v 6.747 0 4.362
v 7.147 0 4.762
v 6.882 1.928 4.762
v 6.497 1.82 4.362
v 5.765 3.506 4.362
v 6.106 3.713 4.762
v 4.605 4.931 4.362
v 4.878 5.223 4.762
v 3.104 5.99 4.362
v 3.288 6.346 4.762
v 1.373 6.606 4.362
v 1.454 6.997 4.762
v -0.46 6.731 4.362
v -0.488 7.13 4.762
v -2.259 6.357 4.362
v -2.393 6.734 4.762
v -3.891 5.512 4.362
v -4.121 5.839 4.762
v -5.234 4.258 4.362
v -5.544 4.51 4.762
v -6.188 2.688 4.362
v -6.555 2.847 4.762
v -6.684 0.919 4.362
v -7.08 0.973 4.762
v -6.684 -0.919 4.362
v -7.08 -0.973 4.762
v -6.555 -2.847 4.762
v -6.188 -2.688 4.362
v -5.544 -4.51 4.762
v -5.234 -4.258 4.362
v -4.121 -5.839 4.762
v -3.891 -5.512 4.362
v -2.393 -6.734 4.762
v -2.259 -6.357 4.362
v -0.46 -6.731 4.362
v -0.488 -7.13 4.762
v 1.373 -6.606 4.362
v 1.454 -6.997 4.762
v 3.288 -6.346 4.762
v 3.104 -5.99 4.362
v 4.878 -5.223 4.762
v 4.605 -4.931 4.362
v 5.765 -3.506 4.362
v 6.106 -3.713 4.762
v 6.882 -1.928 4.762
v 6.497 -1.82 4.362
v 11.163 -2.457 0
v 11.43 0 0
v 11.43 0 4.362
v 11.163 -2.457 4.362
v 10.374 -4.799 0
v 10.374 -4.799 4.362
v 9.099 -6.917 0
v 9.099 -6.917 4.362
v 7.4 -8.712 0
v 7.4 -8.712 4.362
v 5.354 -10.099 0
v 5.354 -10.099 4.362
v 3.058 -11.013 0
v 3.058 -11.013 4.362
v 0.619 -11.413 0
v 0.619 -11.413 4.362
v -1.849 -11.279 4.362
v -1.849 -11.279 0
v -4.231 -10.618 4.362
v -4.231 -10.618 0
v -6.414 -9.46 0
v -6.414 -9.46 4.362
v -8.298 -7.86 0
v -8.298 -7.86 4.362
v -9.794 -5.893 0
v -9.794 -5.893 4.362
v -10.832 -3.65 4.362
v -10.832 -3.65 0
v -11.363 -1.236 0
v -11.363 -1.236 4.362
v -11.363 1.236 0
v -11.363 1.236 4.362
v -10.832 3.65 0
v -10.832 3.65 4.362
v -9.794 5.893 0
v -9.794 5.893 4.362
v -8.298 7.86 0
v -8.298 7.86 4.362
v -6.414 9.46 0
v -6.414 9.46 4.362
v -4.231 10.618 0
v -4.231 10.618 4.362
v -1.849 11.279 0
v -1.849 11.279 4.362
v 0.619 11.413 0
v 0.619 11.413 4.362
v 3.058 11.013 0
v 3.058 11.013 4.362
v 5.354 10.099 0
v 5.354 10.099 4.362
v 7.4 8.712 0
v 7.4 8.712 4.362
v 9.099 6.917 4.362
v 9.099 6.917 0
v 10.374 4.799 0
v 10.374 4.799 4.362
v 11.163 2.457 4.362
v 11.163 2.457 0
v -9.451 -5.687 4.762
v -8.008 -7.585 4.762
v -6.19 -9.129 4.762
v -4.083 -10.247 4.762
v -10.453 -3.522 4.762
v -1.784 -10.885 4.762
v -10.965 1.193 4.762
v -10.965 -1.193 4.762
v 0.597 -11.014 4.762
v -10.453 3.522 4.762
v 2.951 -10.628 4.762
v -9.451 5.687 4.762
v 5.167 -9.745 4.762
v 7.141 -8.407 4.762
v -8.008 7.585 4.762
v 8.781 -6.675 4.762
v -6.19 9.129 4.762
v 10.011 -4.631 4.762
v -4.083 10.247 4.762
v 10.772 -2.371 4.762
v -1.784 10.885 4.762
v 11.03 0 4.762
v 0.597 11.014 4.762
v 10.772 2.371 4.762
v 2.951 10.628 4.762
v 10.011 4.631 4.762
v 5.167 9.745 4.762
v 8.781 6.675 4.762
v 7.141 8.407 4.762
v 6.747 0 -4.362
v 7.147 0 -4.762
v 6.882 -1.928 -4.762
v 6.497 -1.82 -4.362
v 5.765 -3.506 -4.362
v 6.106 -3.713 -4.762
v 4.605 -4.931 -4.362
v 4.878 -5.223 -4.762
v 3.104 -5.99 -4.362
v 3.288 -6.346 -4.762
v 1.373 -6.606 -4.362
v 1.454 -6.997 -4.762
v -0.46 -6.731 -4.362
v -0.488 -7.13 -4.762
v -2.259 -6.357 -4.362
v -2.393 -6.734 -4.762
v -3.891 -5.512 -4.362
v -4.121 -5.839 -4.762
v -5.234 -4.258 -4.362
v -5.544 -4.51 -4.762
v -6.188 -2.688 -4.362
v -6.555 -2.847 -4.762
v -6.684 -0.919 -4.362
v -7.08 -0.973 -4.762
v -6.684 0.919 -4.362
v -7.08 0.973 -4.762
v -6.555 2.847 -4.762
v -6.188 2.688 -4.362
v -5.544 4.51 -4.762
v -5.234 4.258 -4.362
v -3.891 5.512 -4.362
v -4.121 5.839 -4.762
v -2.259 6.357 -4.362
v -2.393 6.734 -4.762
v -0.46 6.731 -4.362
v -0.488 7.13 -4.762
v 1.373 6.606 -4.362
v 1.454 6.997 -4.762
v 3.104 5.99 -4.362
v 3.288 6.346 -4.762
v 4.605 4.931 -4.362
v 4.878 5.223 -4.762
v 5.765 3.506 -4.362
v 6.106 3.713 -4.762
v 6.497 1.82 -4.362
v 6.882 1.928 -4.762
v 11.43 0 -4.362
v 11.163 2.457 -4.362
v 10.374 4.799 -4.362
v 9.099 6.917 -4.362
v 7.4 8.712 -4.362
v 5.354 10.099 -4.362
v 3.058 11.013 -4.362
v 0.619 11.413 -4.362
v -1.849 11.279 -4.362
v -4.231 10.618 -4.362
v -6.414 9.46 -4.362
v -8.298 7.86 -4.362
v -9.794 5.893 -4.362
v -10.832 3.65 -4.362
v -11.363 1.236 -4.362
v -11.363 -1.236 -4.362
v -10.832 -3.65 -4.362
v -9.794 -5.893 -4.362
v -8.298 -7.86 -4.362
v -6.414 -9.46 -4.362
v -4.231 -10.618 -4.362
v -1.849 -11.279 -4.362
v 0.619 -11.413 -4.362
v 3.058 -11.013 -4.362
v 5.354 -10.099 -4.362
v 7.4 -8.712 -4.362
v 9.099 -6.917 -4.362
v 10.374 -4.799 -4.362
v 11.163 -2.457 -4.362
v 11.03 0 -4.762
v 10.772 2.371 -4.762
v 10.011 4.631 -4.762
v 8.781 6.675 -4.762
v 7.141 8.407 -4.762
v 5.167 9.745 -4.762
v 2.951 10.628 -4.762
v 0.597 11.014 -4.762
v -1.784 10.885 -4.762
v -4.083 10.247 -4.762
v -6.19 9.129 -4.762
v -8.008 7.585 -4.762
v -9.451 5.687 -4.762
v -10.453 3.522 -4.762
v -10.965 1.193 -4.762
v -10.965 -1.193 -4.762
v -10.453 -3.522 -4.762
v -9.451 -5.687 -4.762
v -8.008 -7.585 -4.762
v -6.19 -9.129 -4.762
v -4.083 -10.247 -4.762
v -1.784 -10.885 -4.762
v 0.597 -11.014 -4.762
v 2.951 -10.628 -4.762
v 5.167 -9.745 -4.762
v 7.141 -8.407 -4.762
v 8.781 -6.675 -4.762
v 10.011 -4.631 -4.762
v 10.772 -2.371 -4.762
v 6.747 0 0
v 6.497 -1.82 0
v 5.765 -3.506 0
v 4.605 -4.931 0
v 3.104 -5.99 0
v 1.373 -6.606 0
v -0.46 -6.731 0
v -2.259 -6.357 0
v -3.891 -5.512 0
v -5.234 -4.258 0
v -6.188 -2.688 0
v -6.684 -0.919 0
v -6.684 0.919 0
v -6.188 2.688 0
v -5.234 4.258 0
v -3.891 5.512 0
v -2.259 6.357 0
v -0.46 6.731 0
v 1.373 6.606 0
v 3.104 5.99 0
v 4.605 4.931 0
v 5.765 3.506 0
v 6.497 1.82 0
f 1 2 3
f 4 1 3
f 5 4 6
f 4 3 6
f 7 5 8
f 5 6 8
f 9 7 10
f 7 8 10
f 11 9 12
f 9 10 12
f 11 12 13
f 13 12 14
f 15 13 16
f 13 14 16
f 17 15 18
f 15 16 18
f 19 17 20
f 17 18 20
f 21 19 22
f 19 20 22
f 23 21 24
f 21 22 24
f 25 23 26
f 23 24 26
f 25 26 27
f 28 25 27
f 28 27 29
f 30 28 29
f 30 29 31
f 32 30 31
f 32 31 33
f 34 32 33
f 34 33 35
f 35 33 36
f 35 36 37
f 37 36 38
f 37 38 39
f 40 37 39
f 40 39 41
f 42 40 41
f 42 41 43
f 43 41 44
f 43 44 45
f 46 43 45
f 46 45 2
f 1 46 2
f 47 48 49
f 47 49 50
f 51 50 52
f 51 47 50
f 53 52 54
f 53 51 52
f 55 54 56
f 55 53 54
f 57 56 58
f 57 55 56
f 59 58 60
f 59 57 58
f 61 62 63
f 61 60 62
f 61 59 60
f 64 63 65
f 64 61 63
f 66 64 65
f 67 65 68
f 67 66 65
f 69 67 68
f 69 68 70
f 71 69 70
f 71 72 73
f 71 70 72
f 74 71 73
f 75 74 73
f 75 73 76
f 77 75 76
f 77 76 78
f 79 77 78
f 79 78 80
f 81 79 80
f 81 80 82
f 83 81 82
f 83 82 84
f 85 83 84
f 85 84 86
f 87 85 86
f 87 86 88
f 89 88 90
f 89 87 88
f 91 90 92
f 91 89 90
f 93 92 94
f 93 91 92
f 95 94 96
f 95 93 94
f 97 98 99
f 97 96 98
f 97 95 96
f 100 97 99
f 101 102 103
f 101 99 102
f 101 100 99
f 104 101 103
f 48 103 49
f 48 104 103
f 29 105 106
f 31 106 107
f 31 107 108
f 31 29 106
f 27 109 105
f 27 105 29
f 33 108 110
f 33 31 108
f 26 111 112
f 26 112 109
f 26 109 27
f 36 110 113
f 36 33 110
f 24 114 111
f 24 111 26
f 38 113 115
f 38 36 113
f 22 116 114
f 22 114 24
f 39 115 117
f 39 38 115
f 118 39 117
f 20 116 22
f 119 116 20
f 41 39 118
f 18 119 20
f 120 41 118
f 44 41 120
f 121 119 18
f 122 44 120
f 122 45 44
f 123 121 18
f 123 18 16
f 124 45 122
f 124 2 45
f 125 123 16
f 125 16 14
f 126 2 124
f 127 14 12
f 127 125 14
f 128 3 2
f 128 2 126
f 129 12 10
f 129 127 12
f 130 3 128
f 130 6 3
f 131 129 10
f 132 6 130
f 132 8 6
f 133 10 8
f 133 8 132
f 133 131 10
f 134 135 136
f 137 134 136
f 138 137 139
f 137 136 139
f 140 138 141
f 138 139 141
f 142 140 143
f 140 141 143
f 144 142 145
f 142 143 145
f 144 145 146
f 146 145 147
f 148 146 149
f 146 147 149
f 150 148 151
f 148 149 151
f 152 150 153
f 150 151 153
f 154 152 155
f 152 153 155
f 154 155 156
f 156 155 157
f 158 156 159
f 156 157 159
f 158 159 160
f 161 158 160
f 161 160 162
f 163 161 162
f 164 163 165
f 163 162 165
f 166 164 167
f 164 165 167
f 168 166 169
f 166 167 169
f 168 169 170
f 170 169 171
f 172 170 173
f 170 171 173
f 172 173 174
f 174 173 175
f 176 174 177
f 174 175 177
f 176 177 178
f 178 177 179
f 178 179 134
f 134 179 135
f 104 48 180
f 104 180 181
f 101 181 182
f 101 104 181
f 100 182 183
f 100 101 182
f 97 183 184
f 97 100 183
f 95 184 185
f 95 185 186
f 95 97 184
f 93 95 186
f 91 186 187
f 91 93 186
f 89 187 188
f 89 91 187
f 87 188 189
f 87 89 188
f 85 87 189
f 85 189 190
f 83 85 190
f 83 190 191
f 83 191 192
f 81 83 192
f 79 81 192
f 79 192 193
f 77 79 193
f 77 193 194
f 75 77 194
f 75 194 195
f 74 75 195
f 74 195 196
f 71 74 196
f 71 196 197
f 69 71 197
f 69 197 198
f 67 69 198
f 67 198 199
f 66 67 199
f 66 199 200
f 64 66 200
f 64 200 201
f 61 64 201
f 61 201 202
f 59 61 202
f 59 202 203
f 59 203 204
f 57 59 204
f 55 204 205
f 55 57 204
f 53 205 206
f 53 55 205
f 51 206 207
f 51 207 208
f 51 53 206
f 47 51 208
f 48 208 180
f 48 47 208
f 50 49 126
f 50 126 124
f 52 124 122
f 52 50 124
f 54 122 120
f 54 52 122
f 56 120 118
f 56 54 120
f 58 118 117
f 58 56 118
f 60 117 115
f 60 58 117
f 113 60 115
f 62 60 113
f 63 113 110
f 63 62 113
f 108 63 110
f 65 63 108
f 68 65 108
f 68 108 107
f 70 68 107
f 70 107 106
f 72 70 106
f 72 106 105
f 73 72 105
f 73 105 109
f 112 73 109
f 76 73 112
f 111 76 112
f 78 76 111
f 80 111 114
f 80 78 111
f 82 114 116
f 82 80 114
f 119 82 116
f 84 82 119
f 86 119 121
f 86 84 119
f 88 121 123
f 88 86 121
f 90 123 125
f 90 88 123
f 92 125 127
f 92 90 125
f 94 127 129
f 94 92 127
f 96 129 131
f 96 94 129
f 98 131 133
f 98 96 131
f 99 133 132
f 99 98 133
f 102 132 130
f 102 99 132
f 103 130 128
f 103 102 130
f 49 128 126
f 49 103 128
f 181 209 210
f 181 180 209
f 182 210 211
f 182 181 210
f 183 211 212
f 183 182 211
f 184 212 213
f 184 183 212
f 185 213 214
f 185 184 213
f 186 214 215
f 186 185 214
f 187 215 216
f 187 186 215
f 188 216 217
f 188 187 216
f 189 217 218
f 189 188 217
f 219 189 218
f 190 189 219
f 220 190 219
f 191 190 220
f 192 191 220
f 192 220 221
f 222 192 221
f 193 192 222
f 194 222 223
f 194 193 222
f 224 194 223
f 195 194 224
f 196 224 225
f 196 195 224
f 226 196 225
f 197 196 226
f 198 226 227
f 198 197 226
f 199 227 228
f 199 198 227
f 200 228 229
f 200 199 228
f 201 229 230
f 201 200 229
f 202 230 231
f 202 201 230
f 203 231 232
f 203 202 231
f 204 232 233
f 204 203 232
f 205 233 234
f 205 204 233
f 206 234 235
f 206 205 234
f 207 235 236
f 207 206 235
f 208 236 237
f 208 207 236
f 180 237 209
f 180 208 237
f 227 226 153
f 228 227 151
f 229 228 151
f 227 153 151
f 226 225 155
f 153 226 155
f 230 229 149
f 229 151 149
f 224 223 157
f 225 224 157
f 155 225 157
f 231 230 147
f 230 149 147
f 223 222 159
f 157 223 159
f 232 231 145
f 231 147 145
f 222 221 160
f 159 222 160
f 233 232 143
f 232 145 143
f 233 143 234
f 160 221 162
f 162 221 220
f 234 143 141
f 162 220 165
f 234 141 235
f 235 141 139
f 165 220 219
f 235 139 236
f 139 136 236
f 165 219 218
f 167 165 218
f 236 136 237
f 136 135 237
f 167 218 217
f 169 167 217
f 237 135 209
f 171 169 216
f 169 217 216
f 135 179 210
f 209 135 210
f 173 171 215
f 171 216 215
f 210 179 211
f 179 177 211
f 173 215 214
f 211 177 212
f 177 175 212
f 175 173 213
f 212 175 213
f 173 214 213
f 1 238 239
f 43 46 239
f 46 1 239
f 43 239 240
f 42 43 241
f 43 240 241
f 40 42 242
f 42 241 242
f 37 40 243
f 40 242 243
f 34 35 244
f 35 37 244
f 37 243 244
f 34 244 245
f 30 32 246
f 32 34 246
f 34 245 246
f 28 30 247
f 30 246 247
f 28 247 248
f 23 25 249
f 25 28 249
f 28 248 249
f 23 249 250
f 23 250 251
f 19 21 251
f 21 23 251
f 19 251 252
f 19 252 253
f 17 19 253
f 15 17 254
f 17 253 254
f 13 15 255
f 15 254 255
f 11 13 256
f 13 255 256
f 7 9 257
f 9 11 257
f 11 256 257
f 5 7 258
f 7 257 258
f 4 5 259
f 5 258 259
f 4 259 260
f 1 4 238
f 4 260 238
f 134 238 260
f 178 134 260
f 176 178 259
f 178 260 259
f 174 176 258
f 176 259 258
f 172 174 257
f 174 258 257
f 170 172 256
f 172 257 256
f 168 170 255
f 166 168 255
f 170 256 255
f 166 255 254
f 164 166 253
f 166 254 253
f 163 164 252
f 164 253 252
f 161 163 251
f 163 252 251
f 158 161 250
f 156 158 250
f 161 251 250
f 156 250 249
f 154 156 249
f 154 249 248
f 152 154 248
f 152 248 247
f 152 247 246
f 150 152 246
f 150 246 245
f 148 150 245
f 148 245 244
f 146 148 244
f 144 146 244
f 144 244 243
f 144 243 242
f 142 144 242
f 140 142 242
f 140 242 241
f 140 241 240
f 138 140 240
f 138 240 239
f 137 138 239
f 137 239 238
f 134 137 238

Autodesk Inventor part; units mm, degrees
ref_plane "YZ Plane" through (0, 0, 0) normal (1, 0, 0) x (0, 1, 0)
ref_plane "XZ Plane" through (0, 0, 0) normal (0, 1, 0) x (-1, 0, 0)
ref_plane "XY Plane" through (0, 0, 0) normal (0, 0, 1) x (1, 0, 0)
sketch "Sketch1" plane through (0, 0, 0) normal (0, 0, 1) x (1, 0, 0)
  circle A0 centre (0, 0) radius 11.43
  circle A1 centre (0, 0) radius 6.7469
  dimension "d0" = 22.86
  dimension "d1" = 13.4938
extrude "Extrusion1" add sketch "Sketch1" along normal mid plane 9.525
chamfer "Chamfer1" distance 0.4 angle 45 4 edges at (-11.43, 0, 4.7625) (-11.43, 0, -4.7625) (-6.7469, 0, 4.7625) (-6.7469, 0, -4.7625)
sketch "Sketch2" plane through (0, 0, 0) normal (1, 0, 0) x (0, 1, 0)
  point P0 (0, 0)
properties part number "3d printed nut" material "ABS Plastic"
